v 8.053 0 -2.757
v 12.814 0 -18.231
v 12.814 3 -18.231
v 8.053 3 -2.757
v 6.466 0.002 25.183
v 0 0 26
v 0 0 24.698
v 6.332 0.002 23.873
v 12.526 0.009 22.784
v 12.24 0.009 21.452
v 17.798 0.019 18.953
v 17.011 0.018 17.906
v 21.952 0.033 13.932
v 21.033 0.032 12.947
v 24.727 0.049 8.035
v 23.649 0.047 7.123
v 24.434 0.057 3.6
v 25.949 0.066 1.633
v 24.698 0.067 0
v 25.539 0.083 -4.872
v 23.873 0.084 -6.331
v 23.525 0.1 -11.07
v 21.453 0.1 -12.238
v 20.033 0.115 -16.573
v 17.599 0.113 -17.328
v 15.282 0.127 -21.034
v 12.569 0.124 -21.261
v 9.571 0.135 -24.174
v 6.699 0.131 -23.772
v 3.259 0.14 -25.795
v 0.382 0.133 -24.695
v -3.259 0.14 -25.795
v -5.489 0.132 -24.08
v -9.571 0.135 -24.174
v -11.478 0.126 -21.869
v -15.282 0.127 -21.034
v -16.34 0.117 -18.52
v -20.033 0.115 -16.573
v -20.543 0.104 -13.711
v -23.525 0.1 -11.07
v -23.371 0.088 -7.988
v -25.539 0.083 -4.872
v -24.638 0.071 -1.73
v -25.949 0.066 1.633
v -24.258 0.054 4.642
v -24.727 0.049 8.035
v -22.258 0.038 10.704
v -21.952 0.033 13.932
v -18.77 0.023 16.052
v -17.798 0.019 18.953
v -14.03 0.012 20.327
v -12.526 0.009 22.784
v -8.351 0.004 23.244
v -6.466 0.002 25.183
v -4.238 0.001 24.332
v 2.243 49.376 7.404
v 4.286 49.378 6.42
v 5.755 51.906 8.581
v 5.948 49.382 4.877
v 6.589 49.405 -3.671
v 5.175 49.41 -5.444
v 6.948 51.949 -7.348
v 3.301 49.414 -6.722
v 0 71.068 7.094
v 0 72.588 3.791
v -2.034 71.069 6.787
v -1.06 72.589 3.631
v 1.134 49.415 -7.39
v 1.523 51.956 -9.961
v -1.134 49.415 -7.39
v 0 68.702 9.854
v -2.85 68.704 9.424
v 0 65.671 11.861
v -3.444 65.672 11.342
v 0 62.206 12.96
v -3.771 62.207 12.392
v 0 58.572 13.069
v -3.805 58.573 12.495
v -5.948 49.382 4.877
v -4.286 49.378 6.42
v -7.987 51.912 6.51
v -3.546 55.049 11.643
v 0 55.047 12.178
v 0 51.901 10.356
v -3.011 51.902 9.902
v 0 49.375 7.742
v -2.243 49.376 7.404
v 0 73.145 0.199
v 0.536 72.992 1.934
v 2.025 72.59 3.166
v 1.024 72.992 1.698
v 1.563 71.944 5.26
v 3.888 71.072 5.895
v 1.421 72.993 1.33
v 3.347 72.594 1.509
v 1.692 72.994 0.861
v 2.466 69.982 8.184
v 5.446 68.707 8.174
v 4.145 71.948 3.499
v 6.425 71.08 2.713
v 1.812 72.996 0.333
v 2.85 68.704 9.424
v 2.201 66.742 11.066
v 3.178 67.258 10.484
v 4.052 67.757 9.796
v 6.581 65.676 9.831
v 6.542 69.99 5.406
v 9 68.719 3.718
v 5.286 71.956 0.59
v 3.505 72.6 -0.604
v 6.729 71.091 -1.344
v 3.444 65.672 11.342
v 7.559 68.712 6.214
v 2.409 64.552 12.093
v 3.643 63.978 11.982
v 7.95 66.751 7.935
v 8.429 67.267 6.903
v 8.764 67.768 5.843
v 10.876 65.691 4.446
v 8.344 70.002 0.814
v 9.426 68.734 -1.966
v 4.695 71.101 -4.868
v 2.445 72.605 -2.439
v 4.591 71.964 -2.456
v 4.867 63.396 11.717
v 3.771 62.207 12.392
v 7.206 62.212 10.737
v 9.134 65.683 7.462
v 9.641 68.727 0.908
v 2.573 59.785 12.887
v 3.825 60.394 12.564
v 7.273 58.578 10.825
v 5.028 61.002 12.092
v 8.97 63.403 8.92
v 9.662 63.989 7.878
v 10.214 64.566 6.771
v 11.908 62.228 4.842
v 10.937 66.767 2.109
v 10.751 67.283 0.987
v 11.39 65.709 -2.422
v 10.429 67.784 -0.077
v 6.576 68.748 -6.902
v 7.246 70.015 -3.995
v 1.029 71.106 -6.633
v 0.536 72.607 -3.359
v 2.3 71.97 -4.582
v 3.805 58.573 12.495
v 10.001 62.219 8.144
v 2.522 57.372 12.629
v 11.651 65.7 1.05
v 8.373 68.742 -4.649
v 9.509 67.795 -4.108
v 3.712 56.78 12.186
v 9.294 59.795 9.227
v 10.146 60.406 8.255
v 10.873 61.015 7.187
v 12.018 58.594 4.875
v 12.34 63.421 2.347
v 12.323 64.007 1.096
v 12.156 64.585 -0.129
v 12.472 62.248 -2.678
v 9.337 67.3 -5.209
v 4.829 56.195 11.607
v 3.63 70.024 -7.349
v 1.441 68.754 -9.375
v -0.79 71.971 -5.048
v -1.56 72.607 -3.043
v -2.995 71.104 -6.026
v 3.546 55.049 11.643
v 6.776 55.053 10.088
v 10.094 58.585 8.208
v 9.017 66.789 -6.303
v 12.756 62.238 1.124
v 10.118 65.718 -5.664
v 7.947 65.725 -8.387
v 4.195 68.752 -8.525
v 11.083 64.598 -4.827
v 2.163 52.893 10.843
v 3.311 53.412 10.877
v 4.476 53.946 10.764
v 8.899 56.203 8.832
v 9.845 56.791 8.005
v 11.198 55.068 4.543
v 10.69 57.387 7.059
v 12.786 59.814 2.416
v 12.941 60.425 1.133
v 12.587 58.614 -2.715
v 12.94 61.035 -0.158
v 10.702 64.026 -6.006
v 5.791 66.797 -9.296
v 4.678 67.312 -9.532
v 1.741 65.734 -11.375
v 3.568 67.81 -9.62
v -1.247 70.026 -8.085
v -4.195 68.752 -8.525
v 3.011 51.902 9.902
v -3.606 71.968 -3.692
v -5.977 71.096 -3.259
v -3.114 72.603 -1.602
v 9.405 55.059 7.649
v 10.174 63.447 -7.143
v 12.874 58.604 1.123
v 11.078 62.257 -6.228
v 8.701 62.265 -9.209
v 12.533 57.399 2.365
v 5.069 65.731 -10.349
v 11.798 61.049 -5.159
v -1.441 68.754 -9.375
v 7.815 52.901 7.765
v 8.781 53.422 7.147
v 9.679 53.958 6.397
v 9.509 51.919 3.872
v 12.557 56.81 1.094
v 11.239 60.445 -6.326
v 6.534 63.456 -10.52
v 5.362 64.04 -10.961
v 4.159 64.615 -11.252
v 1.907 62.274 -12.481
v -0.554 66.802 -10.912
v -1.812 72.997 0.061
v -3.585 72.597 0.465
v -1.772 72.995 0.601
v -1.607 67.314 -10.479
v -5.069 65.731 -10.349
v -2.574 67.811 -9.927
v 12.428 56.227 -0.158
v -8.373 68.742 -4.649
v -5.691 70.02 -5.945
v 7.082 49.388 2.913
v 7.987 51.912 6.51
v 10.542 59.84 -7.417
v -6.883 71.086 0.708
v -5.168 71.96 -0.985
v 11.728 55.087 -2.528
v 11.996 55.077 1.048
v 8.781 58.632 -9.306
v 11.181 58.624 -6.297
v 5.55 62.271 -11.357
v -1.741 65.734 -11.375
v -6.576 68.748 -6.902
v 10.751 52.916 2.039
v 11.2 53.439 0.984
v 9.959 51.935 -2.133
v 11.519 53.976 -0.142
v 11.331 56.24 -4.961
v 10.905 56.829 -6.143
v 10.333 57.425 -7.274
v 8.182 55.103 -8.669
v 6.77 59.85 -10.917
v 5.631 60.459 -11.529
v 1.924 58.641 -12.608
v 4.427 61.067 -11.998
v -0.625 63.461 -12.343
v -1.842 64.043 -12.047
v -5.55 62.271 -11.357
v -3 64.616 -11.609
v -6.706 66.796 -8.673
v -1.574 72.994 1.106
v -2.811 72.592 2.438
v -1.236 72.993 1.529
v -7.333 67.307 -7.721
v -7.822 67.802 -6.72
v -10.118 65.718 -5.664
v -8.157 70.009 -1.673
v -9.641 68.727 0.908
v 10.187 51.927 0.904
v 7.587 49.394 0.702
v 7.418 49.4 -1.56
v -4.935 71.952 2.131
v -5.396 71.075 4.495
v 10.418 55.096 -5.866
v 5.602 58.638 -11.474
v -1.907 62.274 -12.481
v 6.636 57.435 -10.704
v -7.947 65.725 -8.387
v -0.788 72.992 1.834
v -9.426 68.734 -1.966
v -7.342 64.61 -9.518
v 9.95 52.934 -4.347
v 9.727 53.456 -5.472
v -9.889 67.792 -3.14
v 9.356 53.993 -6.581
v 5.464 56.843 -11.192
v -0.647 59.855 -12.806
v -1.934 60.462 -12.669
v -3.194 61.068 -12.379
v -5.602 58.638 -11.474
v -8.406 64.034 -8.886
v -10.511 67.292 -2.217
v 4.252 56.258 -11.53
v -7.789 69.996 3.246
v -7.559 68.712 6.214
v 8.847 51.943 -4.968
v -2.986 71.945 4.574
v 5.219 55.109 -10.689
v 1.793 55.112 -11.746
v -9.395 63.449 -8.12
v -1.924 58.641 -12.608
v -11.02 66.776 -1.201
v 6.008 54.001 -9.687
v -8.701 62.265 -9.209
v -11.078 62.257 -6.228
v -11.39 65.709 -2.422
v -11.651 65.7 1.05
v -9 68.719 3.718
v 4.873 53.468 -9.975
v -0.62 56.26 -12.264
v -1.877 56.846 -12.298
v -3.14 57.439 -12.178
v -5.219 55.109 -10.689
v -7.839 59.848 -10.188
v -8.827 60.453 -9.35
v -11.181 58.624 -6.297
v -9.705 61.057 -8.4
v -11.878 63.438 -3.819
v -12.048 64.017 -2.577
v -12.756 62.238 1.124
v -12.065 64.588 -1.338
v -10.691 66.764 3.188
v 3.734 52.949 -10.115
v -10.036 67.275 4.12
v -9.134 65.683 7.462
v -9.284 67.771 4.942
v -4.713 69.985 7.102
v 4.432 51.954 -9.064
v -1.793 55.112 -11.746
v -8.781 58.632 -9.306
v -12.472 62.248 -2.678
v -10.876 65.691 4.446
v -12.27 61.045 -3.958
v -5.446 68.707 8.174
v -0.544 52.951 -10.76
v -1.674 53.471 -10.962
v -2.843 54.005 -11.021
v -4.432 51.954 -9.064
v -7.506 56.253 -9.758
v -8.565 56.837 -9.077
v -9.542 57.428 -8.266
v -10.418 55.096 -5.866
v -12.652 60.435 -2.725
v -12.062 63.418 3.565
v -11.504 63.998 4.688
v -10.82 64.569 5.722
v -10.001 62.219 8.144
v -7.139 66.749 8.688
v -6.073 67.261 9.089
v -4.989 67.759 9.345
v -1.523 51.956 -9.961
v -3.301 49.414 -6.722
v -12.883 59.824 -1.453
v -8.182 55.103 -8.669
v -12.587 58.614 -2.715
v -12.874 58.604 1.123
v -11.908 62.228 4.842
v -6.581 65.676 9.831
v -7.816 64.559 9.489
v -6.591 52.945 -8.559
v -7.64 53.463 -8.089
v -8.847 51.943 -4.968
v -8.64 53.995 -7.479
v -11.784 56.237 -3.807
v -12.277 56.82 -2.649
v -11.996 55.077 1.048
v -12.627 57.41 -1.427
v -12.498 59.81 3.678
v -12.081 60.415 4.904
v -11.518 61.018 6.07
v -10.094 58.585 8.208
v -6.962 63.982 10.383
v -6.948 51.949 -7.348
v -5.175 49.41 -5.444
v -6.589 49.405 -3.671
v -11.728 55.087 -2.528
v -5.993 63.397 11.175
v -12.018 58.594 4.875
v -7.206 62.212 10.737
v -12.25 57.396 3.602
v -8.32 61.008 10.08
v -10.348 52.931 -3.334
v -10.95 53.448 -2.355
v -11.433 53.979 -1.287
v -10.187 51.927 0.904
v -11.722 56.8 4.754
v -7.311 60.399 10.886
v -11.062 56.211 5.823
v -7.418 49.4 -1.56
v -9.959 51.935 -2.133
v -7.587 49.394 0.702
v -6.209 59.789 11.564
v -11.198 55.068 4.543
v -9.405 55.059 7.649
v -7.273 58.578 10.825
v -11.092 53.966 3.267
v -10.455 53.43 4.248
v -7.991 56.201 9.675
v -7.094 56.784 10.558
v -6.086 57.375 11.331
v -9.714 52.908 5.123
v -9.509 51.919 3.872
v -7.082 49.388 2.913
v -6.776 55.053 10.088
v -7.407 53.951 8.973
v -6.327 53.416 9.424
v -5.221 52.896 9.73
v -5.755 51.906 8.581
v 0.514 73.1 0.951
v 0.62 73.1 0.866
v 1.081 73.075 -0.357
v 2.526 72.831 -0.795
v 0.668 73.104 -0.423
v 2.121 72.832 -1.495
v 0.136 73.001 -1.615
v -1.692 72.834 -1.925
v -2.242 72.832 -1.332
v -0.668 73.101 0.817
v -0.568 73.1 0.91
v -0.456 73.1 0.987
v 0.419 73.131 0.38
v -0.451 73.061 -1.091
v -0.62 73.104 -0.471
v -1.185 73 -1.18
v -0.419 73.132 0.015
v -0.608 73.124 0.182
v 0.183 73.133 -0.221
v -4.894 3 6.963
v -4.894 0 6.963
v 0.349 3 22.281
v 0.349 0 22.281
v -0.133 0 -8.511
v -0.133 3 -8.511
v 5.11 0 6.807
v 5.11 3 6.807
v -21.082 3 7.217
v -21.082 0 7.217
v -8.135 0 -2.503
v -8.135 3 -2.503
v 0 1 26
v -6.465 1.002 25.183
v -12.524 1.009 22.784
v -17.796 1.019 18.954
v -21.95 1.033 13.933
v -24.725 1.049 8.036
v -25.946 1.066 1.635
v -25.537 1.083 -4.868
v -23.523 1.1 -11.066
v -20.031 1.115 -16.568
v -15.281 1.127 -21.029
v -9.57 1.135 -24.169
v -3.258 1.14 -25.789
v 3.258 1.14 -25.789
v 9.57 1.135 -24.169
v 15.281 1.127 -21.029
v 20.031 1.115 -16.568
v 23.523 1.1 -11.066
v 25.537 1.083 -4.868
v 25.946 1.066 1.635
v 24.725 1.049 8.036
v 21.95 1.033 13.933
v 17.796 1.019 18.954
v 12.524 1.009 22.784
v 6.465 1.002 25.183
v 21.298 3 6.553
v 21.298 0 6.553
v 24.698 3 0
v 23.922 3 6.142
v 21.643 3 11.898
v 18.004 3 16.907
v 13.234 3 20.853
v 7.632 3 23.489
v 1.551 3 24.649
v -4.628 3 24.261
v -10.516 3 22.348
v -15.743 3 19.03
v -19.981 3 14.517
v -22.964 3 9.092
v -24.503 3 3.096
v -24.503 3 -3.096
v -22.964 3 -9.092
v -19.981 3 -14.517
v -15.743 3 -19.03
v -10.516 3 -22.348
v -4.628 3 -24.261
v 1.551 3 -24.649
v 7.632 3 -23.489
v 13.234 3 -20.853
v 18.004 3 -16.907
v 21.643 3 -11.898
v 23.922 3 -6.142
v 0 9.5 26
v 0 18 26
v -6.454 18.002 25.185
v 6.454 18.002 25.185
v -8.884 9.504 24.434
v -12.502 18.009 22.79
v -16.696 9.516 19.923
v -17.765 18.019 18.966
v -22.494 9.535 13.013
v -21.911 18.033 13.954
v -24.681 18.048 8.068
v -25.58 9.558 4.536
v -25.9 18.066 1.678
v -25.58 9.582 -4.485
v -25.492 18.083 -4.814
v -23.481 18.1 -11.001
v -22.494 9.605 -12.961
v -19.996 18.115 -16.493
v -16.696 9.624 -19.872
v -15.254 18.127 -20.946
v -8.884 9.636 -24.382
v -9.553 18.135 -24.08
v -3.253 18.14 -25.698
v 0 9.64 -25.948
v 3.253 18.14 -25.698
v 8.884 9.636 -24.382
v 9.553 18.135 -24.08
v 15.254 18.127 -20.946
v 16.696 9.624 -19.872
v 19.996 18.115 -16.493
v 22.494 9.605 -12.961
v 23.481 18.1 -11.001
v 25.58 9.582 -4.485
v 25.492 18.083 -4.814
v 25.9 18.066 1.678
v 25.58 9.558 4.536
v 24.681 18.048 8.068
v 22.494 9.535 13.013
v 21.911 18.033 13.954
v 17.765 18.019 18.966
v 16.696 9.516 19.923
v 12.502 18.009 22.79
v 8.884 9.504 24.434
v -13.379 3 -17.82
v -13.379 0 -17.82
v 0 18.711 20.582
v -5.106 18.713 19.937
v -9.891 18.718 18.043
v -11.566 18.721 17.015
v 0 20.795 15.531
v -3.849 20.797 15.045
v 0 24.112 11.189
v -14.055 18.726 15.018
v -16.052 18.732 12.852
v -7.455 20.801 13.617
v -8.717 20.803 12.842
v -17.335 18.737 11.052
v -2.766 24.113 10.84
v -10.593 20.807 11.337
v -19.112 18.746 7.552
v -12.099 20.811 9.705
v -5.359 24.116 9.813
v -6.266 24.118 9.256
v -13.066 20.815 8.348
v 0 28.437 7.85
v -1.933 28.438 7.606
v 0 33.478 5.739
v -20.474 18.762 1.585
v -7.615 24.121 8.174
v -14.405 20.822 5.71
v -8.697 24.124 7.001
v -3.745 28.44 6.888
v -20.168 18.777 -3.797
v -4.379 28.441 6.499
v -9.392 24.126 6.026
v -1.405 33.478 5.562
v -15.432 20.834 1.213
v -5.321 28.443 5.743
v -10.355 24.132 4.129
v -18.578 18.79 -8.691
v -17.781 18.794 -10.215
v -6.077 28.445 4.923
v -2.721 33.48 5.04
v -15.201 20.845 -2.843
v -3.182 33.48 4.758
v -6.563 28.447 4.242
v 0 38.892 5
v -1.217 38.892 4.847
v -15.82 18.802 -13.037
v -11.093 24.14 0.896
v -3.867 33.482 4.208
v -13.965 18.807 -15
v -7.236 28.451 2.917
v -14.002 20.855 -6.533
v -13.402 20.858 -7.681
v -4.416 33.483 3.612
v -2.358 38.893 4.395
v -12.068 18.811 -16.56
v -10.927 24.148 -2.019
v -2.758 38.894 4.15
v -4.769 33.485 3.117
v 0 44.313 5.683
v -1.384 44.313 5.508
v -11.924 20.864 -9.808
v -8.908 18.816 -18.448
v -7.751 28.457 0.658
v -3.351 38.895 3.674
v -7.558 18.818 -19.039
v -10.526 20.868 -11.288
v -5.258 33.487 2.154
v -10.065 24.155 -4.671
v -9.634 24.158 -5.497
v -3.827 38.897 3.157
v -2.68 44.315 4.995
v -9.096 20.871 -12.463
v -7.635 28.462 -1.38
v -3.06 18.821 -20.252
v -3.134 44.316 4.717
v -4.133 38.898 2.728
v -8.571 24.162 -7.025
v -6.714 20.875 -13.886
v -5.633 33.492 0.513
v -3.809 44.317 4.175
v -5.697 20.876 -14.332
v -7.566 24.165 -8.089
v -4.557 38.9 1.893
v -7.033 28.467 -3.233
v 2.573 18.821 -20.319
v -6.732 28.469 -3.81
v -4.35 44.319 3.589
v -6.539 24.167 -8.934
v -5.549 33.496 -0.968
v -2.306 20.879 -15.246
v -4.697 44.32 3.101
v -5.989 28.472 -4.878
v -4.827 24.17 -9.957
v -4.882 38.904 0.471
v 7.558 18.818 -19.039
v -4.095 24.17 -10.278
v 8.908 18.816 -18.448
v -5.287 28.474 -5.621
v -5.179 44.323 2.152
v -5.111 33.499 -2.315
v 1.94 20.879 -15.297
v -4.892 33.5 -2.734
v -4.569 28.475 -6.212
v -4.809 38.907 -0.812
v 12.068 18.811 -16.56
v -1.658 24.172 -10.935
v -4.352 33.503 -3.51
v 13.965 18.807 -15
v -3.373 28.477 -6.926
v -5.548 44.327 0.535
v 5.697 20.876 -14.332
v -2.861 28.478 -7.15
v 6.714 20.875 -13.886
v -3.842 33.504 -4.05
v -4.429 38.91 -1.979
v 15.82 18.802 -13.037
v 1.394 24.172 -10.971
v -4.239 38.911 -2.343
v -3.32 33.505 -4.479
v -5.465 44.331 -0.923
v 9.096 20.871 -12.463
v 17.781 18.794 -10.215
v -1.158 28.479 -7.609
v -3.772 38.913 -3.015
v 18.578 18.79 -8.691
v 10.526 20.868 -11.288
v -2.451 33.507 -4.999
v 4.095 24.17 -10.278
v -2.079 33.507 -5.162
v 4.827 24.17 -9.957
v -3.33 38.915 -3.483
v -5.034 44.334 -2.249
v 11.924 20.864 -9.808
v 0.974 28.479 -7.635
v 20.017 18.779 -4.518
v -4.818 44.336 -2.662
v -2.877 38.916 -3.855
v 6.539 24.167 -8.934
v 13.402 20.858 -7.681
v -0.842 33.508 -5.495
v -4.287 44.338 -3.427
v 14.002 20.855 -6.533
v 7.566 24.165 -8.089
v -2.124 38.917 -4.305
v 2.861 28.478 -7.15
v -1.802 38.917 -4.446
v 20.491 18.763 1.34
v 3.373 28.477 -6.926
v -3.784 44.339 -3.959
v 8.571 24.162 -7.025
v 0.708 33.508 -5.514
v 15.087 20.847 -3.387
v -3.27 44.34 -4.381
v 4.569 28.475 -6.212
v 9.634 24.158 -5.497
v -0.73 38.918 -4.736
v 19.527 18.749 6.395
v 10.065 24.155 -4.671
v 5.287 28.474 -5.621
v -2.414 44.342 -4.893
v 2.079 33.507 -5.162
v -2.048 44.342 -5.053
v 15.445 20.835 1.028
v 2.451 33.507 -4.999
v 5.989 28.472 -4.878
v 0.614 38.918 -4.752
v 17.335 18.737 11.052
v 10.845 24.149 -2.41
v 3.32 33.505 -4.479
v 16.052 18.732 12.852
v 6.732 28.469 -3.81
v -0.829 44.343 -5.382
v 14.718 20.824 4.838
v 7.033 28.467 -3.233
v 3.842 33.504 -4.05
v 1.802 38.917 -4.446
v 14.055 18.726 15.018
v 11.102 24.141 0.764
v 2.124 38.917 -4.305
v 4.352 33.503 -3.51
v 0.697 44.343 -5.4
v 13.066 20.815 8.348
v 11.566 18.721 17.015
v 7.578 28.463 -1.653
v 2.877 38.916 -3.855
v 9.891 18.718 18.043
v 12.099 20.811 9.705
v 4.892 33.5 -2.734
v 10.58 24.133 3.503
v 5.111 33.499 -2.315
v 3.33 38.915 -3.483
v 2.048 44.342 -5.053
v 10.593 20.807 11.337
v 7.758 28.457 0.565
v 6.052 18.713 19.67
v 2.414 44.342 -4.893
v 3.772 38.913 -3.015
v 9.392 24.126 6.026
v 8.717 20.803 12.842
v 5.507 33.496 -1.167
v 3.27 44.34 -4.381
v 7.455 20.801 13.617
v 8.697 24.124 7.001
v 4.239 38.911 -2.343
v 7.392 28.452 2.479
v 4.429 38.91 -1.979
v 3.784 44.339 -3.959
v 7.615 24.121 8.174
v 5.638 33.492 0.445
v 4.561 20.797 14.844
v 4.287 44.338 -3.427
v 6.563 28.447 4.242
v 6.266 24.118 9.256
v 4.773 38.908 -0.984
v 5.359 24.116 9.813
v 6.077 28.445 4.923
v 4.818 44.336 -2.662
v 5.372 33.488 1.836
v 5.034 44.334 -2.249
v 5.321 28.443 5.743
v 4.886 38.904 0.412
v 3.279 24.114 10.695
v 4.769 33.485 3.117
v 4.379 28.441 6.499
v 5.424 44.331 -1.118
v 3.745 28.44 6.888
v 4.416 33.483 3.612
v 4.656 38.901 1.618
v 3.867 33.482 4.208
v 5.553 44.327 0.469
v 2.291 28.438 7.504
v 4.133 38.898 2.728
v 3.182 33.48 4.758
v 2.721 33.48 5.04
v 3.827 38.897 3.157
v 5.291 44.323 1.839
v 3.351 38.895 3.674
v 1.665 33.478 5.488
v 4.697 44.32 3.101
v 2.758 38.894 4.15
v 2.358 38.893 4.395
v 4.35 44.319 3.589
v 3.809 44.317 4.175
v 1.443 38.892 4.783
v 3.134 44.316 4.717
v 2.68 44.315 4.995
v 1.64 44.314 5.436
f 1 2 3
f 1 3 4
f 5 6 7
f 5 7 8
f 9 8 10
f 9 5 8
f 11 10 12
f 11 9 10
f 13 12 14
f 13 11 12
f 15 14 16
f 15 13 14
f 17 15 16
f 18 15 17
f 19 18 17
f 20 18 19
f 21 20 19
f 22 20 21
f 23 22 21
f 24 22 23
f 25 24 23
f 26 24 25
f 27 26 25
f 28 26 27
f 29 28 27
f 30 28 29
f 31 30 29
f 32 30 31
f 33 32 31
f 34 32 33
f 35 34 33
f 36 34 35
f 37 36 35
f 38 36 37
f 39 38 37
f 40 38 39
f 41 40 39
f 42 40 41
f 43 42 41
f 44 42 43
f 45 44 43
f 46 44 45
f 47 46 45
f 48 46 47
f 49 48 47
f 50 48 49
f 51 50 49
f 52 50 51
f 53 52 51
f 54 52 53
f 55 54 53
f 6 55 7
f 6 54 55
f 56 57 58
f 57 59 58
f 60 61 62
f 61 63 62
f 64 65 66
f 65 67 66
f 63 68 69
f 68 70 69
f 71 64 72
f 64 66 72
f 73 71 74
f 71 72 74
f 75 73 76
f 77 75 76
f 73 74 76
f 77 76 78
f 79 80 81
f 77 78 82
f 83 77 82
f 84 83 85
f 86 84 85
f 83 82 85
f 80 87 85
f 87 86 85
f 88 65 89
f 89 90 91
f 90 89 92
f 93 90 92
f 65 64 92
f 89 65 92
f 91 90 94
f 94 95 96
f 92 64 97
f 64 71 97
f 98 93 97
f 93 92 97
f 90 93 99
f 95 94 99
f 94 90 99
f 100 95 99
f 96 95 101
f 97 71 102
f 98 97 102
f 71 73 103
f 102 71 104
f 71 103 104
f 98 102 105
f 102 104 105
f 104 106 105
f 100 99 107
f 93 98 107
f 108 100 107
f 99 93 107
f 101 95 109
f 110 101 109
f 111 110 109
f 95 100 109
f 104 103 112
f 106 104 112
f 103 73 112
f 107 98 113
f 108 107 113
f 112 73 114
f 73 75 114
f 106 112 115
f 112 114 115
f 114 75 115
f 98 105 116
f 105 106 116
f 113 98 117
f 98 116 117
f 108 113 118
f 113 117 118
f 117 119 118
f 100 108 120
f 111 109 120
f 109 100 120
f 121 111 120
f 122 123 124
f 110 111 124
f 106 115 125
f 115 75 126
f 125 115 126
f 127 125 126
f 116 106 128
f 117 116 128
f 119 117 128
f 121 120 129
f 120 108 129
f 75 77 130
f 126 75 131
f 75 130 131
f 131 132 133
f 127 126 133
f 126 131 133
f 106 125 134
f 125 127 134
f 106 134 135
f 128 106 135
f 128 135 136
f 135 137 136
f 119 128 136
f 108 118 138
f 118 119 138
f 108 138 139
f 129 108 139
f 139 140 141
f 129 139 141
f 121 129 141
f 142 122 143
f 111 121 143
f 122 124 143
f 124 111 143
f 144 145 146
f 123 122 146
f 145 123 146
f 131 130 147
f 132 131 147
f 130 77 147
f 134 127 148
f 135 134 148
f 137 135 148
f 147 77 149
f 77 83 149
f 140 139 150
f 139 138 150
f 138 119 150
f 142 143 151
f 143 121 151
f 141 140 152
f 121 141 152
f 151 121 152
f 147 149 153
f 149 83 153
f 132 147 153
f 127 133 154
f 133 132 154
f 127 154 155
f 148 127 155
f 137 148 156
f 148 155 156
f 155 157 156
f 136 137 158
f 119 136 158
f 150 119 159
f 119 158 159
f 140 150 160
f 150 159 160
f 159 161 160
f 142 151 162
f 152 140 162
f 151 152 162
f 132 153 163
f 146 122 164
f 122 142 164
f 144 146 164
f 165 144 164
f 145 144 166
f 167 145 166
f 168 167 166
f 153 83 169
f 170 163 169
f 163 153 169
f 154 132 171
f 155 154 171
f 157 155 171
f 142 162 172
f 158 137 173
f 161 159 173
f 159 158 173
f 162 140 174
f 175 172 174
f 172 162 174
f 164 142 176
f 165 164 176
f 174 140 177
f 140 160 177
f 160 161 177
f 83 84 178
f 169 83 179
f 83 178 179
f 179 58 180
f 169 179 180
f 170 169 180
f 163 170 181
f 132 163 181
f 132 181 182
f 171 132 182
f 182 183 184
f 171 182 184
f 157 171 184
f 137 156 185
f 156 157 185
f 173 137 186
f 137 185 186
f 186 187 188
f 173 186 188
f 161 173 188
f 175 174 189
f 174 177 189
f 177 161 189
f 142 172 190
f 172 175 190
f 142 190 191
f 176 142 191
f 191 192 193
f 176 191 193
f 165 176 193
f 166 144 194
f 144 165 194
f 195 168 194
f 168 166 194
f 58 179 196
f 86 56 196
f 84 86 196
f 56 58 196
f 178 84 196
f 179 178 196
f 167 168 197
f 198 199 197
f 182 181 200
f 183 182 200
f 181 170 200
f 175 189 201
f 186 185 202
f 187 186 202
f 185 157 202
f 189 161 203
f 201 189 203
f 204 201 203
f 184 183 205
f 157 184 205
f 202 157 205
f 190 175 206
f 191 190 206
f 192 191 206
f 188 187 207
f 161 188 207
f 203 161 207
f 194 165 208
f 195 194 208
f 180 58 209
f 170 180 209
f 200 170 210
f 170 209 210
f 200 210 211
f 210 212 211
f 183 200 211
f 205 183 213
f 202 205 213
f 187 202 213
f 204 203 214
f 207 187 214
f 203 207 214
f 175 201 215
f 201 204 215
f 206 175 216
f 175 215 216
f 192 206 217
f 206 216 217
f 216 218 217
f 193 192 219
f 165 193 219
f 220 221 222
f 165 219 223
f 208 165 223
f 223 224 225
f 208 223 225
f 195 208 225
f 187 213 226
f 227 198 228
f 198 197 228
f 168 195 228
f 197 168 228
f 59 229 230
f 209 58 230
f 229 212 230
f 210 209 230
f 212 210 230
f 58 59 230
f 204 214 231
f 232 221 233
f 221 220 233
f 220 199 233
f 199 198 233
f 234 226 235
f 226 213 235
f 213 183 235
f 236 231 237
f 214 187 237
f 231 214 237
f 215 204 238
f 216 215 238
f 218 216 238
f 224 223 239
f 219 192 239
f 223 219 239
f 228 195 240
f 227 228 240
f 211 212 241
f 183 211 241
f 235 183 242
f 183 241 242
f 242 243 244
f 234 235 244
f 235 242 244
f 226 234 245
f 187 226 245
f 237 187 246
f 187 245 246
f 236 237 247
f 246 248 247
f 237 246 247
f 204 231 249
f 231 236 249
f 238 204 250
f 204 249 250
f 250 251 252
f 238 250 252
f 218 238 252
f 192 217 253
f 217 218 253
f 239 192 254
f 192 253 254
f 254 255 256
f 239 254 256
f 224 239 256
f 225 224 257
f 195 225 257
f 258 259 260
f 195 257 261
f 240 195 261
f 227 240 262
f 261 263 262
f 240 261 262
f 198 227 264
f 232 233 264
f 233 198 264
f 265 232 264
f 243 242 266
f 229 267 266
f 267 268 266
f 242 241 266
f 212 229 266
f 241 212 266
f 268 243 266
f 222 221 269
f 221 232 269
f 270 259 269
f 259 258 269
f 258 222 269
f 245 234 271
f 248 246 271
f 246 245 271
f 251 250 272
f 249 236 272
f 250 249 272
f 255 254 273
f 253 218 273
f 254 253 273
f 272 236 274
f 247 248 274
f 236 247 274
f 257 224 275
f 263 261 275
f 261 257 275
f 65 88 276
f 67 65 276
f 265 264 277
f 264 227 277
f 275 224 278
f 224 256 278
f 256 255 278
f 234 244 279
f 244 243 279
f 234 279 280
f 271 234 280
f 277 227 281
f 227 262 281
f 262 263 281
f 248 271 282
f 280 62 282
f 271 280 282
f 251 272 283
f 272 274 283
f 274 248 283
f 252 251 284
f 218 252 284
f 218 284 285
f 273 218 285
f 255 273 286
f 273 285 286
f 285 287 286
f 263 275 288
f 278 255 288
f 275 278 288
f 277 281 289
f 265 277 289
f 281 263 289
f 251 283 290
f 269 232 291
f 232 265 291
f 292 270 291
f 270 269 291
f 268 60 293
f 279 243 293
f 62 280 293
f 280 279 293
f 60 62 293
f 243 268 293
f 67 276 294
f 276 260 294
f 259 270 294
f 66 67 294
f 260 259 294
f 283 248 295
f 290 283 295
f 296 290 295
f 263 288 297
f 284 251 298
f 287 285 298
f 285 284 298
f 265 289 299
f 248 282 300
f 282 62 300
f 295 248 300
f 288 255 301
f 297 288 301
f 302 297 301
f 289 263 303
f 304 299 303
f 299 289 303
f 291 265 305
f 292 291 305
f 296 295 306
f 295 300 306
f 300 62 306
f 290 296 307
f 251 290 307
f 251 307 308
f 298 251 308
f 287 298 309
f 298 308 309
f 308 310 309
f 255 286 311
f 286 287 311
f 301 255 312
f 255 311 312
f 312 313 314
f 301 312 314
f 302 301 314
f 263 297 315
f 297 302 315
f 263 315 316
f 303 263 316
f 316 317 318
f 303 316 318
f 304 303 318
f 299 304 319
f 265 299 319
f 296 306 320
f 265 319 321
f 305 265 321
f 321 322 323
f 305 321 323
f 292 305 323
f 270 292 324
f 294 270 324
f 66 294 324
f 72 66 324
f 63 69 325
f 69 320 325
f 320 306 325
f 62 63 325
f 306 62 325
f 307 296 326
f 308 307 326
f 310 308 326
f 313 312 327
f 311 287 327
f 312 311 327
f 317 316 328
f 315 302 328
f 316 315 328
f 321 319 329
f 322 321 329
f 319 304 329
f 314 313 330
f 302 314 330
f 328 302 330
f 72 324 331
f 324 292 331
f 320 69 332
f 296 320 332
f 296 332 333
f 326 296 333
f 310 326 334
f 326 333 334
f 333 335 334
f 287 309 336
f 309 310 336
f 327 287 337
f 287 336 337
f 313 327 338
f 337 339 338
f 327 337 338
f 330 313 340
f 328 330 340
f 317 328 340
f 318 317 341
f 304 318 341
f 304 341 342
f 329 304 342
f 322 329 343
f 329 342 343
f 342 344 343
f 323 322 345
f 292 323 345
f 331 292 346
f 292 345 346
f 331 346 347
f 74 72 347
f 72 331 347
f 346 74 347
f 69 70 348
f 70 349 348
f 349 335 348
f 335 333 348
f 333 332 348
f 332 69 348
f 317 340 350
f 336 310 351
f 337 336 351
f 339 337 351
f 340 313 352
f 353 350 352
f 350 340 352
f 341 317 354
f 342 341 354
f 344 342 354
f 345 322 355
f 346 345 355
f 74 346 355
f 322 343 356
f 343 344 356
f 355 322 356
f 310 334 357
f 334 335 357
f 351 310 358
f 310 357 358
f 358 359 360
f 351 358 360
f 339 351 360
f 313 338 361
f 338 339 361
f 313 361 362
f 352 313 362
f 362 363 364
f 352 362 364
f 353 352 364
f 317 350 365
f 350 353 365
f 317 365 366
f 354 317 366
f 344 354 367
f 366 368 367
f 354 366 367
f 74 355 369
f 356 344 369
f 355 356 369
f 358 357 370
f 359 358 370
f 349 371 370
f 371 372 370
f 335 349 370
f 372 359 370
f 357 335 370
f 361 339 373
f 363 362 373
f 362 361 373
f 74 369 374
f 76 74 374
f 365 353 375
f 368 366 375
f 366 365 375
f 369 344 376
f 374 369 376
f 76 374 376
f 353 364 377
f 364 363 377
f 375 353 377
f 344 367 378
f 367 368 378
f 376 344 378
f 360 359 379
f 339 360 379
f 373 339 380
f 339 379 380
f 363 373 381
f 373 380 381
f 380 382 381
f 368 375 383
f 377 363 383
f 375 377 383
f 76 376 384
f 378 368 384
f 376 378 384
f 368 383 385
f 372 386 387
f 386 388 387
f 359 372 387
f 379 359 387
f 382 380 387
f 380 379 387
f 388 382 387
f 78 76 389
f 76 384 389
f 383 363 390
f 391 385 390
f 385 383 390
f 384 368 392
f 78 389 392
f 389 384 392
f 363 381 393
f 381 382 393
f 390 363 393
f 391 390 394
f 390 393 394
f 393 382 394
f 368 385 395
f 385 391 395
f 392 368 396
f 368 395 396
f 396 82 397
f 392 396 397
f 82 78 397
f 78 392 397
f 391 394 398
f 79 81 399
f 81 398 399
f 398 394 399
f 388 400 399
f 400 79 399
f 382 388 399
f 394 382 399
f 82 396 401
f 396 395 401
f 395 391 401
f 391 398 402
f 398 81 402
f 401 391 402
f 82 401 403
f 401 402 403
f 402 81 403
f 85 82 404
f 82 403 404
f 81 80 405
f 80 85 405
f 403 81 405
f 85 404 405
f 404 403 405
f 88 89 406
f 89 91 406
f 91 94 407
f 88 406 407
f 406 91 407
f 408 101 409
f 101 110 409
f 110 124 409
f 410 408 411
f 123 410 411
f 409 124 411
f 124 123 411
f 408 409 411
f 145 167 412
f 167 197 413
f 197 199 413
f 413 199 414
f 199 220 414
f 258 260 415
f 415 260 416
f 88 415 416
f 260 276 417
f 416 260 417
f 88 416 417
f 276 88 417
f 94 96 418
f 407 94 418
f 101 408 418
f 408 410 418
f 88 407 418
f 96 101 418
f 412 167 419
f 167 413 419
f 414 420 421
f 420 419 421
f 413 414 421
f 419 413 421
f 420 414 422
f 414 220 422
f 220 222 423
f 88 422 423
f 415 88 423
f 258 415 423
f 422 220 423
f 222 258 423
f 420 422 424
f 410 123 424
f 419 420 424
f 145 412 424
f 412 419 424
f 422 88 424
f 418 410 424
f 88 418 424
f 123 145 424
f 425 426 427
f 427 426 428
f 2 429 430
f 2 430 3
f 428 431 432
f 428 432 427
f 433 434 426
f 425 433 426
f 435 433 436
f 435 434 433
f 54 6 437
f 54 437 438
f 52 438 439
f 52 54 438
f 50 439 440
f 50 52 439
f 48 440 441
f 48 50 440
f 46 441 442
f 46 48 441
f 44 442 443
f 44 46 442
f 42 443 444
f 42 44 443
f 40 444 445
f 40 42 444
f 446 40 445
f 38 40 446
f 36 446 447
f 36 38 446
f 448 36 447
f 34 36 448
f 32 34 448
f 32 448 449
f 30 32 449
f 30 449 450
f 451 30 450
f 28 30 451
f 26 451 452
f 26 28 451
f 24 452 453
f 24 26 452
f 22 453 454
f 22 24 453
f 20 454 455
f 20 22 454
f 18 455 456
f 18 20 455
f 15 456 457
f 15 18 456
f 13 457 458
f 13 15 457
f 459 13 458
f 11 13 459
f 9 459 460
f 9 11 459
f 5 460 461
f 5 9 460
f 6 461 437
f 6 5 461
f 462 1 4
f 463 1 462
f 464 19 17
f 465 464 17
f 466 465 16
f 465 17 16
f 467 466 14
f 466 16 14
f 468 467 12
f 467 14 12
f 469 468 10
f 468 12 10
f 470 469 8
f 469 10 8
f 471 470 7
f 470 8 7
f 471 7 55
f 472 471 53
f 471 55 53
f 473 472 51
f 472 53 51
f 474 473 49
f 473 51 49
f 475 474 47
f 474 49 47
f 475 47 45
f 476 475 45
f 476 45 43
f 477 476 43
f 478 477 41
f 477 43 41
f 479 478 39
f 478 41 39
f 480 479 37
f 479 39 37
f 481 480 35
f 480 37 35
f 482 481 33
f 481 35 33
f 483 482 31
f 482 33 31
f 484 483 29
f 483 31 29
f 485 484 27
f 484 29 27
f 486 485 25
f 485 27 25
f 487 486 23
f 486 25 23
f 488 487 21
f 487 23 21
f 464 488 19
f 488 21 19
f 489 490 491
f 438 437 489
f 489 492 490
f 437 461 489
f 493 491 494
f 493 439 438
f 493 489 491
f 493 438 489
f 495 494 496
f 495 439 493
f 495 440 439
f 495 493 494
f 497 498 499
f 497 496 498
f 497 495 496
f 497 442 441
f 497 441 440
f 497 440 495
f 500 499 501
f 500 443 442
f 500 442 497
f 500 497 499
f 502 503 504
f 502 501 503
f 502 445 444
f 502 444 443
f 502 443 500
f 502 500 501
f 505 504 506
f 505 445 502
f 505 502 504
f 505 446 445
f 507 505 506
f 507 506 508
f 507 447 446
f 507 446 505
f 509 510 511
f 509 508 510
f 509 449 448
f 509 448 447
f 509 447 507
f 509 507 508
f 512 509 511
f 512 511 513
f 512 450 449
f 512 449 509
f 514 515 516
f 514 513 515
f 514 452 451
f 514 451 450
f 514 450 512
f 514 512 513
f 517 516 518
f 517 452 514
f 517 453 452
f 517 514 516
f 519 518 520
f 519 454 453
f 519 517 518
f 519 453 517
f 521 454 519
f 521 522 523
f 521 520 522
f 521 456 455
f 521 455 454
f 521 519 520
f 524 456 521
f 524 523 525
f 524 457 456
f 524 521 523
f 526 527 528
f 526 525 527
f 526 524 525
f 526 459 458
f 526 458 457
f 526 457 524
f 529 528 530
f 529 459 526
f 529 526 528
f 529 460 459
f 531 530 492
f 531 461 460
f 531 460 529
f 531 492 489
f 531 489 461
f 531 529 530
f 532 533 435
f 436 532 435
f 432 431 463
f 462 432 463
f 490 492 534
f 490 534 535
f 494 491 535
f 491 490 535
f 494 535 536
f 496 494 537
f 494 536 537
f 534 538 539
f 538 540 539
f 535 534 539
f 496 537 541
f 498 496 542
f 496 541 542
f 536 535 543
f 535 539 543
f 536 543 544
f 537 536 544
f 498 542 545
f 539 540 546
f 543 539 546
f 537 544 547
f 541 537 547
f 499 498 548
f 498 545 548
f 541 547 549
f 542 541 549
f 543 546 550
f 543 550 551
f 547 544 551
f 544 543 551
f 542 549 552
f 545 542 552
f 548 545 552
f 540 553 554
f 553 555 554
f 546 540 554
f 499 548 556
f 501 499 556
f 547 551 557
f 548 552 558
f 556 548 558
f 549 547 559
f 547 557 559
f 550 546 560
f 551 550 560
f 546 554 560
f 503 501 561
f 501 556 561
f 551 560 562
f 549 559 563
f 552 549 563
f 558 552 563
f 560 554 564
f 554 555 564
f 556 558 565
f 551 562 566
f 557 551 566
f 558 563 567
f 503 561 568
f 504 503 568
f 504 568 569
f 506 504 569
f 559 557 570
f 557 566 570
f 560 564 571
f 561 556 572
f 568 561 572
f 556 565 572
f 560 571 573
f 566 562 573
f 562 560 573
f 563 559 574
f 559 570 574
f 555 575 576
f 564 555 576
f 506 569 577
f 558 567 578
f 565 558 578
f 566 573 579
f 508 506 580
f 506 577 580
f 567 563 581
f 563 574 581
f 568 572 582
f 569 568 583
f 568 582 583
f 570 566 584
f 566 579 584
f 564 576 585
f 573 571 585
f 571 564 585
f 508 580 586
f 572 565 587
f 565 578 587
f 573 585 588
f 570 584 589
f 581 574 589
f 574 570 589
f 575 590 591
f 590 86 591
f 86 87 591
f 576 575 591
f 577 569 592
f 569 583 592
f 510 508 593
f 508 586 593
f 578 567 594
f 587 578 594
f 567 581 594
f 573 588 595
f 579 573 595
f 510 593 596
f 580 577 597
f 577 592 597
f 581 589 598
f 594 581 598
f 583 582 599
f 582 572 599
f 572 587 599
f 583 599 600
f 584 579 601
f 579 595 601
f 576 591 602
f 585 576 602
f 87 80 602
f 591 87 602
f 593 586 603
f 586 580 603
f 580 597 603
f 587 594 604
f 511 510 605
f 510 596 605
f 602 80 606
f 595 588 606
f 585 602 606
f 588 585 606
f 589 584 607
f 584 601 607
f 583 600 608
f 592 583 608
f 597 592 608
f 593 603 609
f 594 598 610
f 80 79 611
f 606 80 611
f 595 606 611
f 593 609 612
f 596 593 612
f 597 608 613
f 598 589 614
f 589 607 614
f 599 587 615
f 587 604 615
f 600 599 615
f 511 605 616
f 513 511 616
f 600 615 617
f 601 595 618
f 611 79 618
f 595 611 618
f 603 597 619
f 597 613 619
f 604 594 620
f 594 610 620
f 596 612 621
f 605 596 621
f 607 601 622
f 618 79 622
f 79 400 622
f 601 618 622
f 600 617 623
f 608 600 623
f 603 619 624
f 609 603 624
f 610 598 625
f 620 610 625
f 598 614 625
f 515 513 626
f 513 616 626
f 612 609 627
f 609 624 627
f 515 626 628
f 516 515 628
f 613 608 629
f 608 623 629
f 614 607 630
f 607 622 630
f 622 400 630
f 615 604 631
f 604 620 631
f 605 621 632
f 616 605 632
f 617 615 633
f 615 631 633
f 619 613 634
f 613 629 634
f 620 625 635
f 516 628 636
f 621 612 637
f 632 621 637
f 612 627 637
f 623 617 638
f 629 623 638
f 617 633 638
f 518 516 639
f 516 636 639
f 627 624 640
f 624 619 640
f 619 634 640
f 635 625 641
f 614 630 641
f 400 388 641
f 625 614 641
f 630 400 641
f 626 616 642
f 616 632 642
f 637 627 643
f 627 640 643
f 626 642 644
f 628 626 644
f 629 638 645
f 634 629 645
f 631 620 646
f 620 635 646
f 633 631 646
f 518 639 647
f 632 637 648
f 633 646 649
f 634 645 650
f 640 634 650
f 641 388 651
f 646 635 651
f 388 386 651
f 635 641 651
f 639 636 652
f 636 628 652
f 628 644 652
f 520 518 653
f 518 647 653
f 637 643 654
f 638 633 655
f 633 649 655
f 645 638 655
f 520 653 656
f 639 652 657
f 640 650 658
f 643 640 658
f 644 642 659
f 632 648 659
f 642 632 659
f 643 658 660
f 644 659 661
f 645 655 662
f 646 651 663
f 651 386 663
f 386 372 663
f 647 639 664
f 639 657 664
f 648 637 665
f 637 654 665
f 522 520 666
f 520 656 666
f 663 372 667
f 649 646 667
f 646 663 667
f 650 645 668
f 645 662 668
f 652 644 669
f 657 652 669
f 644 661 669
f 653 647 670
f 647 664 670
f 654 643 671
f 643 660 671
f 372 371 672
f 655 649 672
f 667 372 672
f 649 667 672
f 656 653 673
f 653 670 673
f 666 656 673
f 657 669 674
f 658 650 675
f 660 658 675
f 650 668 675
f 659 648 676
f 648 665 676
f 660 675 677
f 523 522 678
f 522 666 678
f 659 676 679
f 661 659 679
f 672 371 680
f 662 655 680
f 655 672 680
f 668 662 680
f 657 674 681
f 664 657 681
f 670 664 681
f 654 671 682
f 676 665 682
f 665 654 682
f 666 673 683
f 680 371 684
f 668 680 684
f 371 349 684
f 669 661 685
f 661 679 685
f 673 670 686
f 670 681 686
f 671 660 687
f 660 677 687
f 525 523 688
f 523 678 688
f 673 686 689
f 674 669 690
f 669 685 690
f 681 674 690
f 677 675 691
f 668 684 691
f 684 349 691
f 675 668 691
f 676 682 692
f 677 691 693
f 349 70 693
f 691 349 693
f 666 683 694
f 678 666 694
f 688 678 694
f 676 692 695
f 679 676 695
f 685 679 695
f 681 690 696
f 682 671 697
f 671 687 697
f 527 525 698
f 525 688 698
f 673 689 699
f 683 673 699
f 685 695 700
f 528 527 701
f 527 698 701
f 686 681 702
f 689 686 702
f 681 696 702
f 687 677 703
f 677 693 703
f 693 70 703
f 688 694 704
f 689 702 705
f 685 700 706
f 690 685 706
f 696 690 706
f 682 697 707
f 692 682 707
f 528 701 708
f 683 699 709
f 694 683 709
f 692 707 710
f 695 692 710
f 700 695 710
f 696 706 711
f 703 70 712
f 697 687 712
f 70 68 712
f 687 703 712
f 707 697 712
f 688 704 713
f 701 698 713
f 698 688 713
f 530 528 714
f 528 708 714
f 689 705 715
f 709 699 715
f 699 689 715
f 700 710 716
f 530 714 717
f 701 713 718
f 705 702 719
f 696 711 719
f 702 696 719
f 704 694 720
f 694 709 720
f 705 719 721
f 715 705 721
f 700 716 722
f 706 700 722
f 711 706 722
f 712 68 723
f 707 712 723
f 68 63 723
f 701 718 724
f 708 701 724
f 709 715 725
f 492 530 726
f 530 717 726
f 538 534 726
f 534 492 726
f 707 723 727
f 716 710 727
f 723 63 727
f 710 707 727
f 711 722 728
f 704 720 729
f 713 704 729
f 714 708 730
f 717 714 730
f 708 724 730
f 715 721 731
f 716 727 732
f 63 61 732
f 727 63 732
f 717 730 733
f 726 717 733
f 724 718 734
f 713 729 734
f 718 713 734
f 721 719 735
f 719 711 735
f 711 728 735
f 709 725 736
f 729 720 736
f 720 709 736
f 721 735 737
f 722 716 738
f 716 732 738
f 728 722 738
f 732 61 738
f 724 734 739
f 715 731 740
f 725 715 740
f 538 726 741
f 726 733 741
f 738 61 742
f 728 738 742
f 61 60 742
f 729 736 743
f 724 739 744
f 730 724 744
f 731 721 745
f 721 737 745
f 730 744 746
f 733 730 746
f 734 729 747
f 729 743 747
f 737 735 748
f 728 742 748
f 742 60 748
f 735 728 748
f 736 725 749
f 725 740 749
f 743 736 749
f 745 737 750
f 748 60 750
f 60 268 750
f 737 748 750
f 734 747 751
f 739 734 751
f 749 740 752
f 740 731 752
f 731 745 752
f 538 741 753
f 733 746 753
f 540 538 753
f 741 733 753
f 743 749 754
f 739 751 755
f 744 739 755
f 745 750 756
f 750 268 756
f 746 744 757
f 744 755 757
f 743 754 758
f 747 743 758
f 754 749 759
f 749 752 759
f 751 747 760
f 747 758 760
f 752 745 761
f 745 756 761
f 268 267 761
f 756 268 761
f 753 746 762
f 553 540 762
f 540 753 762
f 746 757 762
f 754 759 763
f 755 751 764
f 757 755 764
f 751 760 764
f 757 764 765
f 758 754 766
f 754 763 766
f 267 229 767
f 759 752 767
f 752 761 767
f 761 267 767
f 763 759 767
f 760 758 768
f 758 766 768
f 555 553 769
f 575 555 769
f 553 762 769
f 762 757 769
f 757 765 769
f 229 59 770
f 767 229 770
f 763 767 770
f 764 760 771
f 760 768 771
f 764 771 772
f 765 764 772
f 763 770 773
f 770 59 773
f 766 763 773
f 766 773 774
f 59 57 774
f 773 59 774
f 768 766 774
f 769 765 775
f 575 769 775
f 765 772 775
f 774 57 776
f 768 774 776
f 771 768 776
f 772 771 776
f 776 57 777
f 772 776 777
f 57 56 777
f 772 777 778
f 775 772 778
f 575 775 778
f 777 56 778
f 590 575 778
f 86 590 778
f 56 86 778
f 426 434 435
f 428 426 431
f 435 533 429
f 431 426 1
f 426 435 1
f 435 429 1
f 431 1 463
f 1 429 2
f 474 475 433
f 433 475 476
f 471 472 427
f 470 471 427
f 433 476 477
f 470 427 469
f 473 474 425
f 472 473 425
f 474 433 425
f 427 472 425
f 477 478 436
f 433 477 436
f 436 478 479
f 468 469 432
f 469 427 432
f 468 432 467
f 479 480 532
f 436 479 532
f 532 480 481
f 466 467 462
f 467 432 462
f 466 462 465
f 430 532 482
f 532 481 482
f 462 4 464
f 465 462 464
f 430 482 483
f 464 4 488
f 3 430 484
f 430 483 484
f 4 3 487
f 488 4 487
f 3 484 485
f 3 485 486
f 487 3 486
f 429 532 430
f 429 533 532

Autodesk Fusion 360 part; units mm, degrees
sketch "草图1" plane through (0, 0, 0) normal (1, 0, 0) x (0, 0, -1)
  line L0 (-26, 1) -> (-26, 18)
  arc A0 (-26, 18) -> (-7.7417, 49.3746) centre (-26, 39) ccw
  arc A1 (-0.1986, 73.1451) -> (-7.7417, 49.3746) centre (0, 60) ccw
  line L1 (-26, 1) -> (-26, 0)
  line L2 (-26, 0) -> (0, 0)
  line L3 (0, 0) -> (-0.1986, 73.1451)
revolve "旋转1" add sketch "草图1" angle 360 about axis through (0, 0, 0) along (0, 1, 0.0027)
sketch "草图2" plane through (0, 0, 0) normal (0, 1, 0) x (1, 0, 0)
  circle A0 centre (0, 0) radius 24.6982
extrude "拉伸1" cut sketch "草图2" along normal blind 3
sketch "草图3" plane through (0, 0, 0) normal (0, 1, 0) x (1, 0, 0)
  line L0 (-21.0825, -7.217) -> (21.2981, -6.5533)
  line L1 (-13.3786, 17.8204) -> (0.349, -22.2808)
  line L2 (12.814, 18.2307) -> (0.349, -22.2808)
  line L3 (-21.0825, -7.217) -> (12.814, 18.2307)
  line L4 (-13.3786, 17.8204) -> (21.2981, -6.5533)
extrude "拉伸2" add sketch "草图3" along normal blind 3
